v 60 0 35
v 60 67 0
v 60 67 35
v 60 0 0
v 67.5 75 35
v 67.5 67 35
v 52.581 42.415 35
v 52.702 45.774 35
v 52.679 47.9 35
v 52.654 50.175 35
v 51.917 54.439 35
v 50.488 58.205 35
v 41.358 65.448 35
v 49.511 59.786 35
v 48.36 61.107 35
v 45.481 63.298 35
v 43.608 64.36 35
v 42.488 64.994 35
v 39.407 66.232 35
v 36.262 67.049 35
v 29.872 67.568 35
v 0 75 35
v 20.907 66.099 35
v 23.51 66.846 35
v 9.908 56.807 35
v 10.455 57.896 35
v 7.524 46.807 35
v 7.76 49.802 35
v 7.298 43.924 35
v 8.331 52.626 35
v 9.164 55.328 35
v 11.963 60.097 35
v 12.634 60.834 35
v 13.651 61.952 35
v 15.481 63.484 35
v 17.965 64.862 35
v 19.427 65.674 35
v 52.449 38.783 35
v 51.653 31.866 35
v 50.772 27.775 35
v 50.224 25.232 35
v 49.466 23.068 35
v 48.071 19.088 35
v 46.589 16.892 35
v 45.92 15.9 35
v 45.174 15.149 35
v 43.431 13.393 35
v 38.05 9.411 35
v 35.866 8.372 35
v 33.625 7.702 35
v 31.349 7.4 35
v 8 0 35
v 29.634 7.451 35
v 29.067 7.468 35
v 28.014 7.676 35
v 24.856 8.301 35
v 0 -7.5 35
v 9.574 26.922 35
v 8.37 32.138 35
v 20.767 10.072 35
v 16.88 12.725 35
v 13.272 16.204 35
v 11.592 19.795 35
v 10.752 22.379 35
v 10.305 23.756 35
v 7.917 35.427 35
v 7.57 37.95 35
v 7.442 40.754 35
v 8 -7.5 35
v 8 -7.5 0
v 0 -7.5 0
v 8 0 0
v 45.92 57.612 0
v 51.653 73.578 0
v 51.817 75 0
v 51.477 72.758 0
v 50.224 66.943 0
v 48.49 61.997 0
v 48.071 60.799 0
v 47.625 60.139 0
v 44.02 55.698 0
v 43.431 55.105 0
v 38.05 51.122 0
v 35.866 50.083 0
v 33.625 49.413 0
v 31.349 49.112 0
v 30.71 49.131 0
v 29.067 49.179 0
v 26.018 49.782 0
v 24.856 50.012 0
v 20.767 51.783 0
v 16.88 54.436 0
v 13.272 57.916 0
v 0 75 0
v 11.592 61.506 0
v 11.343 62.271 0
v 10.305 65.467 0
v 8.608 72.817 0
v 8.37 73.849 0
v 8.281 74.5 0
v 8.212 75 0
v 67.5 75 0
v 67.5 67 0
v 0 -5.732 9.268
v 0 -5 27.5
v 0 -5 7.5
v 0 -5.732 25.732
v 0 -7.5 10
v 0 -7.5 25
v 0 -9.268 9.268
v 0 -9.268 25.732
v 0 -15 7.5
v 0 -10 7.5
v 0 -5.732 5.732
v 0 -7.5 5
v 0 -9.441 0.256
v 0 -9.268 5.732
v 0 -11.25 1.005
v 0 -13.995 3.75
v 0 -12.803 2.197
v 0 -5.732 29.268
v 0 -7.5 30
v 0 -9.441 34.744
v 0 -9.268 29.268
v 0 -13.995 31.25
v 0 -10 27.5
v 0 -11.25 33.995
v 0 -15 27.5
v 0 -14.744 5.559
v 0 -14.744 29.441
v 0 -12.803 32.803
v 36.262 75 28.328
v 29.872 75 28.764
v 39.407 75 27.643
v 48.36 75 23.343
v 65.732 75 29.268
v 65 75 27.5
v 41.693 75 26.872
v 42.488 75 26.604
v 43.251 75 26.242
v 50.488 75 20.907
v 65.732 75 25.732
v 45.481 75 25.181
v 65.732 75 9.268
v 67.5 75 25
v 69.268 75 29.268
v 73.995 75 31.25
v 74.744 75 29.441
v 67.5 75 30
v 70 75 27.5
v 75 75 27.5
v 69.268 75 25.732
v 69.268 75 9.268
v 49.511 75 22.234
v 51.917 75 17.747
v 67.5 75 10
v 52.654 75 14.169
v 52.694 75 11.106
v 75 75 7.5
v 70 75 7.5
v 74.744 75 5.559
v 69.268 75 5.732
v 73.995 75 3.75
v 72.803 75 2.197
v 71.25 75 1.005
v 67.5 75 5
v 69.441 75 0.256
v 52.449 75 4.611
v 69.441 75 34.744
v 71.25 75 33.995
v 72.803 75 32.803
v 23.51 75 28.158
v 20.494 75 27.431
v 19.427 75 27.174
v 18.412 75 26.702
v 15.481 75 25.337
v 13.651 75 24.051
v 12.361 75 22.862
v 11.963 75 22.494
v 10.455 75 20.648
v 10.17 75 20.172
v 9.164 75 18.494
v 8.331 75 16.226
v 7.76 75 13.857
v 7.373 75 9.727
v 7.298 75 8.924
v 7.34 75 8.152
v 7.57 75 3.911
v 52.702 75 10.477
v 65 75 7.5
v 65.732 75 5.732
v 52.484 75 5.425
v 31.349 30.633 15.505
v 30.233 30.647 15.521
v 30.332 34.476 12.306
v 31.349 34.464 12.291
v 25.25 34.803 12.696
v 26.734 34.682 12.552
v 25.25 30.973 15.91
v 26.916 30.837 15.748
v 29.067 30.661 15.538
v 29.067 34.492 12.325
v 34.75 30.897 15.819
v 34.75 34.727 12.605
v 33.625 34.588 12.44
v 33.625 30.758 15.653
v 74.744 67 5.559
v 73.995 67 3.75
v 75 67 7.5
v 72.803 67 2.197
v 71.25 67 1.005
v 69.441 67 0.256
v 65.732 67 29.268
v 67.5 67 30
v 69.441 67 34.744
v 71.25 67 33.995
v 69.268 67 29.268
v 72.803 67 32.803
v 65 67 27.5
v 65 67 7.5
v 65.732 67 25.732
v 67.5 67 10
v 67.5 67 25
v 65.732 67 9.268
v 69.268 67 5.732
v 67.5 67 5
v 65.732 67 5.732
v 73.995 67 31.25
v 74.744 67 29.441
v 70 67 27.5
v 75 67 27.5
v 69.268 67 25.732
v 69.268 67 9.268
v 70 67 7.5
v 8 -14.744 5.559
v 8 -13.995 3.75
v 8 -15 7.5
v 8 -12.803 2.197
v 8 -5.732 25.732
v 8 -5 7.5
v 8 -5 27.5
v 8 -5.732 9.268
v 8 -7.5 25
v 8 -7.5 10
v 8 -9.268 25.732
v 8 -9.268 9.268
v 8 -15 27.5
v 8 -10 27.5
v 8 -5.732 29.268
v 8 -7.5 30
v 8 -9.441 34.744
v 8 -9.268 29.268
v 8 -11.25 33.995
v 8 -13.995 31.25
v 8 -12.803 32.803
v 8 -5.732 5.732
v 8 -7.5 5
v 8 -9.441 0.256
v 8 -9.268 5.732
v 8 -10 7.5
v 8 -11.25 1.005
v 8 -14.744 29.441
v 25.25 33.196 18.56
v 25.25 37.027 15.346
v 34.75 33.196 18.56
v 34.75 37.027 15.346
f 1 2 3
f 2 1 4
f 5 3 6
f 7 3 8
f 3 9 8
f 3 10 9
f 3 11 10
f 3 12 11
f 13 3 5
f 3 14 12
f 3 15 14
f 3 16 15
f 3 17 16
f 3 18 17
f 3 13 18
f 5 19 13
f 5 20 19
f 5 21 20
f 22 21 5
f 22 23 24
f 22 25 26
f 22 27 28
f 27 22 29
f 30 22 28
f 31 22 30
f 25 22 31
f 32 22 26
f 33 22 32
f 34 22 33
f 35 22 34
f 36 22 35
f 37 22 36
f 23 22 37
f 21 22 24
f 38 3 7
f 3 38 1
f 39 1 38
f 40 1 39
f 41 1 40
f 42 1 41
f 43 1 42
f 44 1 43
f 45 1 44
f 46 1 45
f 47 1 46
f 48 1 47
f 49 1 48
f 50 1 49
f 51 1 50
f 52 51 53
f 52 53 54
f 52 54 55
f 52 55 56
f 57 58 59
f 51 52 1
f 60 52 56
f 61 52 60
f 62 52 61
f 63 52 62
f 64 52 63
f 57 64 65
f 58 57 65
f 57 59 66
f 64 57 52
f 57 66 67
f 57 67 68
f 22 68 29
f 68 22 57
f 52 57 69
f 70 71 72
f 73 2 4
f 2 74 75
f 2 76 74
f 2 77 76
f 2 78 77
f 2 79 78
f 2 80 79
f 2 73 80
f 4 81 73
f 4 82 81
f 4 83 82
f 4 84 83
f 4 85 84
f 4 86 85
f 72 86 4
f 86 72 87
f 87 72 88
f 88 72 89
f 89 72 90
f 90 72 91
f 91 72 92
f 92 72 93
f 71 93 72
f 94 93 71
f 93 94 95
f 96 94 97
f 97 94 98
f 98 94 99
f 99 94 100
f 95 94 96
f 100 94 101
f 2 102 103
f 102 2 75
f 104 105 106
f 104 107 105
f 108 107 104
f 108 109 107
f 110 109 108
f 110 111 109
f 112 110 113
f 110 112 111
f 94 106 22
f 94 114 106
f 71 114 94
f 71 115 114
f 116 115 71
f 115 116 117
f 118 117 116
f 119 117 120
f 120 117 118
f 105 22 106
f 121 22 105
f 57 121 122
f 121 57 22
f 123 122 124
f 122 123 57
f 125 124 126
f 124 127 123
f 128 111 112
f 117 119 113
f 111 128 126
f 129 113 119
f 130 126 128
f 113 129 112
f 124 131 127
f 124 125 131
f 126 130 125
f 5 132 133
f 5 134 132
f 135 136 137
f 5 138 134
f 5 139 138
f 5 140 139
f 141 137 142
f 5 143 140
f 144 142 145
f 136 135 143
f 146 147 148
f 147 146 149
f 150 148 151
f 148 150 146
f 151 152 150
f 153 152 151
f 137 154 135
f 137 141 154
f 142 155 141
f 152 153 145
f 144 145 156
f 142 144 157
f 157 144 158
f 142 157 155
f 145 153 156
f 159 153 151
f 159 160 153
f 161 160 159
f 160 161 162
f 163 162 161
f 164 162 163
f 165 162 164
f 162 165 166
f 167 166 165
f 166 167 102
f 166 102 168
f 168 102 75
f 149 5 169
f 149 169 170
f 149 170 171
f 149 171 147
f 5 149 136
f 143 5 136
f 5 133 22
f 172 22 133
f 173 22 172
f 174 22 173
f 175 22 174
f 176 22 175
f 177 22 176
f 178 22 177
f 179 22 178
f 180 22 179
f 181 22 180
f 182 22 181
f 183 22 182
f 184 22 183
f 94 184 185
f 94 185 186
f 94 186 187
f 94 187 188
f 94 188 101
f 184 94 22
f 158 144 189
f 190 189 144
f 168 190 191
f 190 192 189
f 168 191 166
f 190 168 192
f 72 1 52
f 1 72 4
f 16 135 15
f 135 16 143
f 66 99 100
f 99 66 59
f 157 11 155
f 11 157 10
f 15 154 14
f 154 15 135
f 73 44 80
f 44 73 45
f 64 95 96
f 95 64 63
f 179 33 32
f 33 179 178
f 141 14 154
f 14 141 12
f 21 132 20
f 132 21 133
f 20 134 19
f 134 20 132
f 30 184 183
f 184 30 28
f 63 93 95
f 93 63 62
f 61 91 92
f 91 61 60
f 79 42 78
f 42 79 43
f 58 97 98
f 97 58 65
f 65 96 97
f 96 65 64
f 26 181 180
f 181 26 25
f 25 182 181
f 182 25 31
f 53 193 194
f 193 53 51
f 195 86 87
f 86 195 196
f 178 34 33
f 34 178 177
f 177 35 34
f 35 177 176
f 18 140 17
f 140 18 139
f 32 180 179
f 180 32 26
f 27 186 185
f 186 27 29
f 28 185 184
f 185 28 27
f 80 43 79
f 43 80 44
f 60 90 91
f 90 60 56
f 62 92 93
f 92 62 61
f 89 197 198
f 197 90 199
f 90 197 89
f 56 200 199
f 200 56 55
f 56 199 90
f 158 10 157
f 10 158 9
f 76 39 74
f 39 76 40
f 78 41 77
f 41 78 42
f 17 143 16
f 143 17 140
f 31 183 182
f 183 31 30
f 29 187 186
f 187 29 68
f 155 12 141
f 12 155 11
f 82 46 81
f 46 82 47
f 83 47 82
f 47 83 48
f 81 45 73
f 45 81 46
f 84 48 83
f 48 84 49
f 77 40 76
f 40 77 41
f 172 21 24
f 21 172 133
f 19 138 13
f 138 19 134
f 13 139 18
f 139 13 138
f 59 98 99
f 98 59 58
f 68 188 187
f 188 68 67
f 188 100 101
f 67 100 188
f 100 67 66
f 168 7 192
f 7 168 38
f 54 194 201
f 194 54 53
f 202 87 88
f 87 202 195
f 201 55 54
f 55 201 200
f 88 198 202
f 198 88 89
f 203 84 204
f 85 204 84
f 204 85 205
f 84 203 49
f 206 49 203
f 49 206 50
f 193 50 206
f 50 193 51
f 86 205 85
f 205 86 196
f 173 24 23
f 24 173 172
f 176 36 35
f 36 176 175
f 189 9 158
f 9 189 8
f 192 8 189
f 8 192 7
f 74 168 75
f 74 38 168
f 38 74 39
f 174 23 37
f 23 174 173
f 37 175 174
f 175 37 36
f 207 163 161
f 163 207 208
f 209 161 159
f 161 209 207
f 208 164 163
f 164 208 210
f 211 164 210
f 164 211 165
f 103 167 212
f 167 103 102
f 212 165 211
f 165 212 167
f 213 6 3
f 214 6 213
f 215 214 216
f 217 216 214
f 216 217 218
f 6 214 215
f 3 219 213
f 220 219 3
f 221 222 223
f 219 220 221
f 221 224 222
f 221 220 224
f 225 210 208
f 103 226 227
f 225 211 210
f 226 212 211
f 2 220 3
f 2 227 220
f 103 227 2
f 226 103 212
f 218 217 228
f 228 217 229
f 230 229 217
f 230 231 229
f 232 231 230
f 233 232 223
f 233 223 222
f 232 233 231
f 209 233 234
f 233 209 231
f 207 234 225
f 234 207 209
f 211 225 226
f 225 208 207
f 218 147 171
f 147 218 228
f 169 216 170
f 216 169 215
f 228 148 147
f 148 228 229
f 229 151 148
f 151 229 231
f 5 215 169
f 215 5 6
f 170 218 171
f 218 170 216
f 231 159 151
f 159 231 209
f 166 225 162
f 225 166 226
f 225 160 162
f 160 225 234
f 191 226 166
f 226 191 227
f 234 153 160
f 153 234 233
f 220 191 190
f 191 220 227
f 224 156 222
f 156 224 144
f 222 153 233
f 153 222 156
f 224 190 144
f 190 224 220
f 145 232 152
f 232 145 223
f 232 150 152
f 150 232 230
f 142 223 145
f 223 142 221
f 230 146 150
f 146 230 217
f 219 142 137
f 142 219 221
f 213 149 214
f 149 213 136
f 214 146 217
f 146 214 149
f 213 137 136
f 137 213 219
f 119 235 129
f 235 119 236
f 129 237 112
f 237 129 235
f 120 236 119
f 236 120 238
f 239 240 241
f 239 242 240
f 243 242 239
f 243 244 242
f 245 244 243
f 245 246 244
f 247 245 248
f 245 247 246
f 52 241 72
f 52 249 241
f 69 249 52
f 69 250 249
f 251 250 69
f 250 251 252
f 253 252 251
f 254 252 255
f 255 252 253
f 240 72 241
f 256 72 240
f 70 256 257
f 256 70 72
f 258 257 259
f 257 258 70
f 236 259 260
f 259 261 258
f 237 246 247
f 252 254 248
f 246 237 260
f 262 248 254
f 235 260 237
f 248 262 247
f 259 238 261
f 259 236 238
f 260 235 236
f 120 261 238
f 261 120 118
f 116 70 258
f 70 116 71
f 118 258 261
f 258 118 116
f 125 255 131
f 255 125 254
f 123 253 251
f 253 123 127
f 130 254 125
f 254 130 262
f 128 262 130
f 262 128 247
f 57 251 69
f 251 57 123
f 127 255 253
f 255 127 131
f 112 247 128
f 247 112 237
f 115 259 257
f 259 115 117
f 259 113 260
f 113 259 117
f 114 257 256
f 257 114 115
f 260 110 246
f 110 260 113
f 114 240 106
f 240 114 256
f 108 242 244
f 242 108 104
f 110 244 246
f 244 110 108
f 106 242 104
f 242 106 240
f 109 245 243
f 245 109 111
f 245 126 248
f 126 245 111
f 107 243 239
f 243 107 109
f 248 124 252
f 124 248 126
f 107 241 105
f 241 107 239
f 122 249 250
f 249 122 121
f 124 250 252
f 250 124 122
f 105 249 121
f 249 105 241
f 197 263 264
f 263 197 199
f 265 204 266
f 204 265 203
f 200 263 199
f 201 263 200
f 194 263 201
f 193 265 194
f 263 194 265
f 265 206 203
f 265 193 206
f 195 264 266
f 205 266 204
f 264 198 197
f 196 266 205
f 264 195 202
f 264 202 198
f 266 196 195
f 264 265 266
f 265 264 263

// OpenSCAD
//Tesla wall connector plug thing
//by Jake Poznanski
//https://www.thingiverse.com/thing:781324

//Changelog
//v2 - More resolution on the mounting holes
//   - Made the holding notch a bit smaller
//Remix - Moved mounting holes to extra brackets for for under/side-mounting

module charger_end(h)
{
  scale([25.4/90, -25.4/90, 1]) union()
  {
    linear_extrude(height=h)
      polygon([[-3.005779,62.149426],[-16.569022,60.425044],[-29.740098,56.758094],[-42.263469,51.264495],[-53.883598,44.060166],[-59.296113,36.626611],[-63.442667,28.424632],[-69.673609,11.070035],[-72.251218,-0.964639],[-73.128456,-13.334130],[-71.639202,-25.505939],[-69.798978,-31.351306],[-67.117335,-36.947566],[-62.956603,-42.264580],[-58.099931,-46.820177],[-52.664468,-50.661352],[-46.767364,-53.835098],[-34.056822,-58.368283],[-20.905493,-60.795689],[-0.413813,-62.289752],[20.169805,-61.215776],[30.303091,-59.524302],[40.227761,-56.961055],[49.866616,-53.449446],[59.142456,-48.912886],[62.850149,-46.178097],[65.994342,-42.902744],[70.599546,-35.106548],[72.972705,-26.276698],[73.128456,-17.165592],[72.312159,-2.690240],[69.749052,11.631724],[65.145865,25.368845],[58.209326,38.089666],[51.282034,44.690079],[43.262963,49.880688],[25.929636,58.127046],[18.896972,60.277821],[11.675306,61.665637],[4.346951,62.289752],[-3.005779,62.149426]]);
  }
}

//Measured dims are 11x6.4 with 4.5mm depth
module charger_notch(){
    translate([0,-16.5,0])
        cube([9.5, 4.5, 5.0], center=true);
}

module screw_hole(){
    translate([0,0,-1])
        cylinder(r=2.5, h = height*2, $fn=100);
}

width = 60;
height = 75;
depth = 35;

bracket_diameter = 15;
bracket_depth = 8;

tilt = 50;

difference(){
    cube([width, height, depth]);

    rotate([tilt,0,0])
        translate([width/2, height/2+sin(tilt)*35/2,-depth*2])       
            scale(1.1)
                charger_end(depth * 3);
}

rotate([tilt,0,0])
    translate([width/2, height/2+sin(tilt)*35/2-1.1,-16]) 
        scale(1)
            charger_notch();

// Mounting brackets:
// (Uncomment whichever brackets you'd like to use)

// For undermounting:
// Top-right
translate([width, height-bracket_depth, 0]) {
    Bracket();
}
// Top-left
//translate([0, height, 0]) {
//    rotate([0, 0, 180]) {
//        Bracket();
//    }
//}

// For side mounting (left):
// Top-left
//translate([bracket_depth, height, 0]) {
//    rotate([0, 0, 90]) {
//        Bracket();
//    }
//}
// Bottom-left
rotate([0, 0, -90]) {
    Bracket();
}

// For side mounting (right):
// Top-right
//translate([width, height, 0]) {
//    rotate([0, 0, 90]) {
//        Bracket();
//    }
//}
// Bottom-right
//translate([width-bracket_depth, 0, 0]) {
//    rotate([0, 0, -90]) {
//        Bracket();
//    }
//}

module Bracket() {
    difference() {
        union() {
            // Full-width section
            cube([bracket_diameter/2, bracket_depth, depth]);
            // Full-height-section
            translate([0, 0, bracket_diameter/2]) {
                cube([bracket_diameter, bracket_depth, depth-bracket_diameter]);
            }
            // Rounded corners
            rotate([-90, 0, 0]) {
                translate([bracket_diameter/2, -bracket_diameter/2, 0]) {
                    cylinder(r=bracket_diameter/2, h=bracket_depth);
                }
                translate([bracket_diameter/2, -(depth-bracket_diameter/2), 0]) {
                    cylinder(r=bracket_diameter/2, h=bracket_depth);
                }
            }
        }
        rotate([-90, 0, 0]) {
            // Screw holes
            translate([bracket_diameter/2, -bracket_diameter/2, -1]) {
                cylinder(r=2.5, h=bracket_depth+2);
            }
            translate([bracket_diameter/2, -(depth-bracket_diameter/2), -1]) {
                cylinder(r=2.5, h=bracket_depth+2);
            }
        }
    }
}
